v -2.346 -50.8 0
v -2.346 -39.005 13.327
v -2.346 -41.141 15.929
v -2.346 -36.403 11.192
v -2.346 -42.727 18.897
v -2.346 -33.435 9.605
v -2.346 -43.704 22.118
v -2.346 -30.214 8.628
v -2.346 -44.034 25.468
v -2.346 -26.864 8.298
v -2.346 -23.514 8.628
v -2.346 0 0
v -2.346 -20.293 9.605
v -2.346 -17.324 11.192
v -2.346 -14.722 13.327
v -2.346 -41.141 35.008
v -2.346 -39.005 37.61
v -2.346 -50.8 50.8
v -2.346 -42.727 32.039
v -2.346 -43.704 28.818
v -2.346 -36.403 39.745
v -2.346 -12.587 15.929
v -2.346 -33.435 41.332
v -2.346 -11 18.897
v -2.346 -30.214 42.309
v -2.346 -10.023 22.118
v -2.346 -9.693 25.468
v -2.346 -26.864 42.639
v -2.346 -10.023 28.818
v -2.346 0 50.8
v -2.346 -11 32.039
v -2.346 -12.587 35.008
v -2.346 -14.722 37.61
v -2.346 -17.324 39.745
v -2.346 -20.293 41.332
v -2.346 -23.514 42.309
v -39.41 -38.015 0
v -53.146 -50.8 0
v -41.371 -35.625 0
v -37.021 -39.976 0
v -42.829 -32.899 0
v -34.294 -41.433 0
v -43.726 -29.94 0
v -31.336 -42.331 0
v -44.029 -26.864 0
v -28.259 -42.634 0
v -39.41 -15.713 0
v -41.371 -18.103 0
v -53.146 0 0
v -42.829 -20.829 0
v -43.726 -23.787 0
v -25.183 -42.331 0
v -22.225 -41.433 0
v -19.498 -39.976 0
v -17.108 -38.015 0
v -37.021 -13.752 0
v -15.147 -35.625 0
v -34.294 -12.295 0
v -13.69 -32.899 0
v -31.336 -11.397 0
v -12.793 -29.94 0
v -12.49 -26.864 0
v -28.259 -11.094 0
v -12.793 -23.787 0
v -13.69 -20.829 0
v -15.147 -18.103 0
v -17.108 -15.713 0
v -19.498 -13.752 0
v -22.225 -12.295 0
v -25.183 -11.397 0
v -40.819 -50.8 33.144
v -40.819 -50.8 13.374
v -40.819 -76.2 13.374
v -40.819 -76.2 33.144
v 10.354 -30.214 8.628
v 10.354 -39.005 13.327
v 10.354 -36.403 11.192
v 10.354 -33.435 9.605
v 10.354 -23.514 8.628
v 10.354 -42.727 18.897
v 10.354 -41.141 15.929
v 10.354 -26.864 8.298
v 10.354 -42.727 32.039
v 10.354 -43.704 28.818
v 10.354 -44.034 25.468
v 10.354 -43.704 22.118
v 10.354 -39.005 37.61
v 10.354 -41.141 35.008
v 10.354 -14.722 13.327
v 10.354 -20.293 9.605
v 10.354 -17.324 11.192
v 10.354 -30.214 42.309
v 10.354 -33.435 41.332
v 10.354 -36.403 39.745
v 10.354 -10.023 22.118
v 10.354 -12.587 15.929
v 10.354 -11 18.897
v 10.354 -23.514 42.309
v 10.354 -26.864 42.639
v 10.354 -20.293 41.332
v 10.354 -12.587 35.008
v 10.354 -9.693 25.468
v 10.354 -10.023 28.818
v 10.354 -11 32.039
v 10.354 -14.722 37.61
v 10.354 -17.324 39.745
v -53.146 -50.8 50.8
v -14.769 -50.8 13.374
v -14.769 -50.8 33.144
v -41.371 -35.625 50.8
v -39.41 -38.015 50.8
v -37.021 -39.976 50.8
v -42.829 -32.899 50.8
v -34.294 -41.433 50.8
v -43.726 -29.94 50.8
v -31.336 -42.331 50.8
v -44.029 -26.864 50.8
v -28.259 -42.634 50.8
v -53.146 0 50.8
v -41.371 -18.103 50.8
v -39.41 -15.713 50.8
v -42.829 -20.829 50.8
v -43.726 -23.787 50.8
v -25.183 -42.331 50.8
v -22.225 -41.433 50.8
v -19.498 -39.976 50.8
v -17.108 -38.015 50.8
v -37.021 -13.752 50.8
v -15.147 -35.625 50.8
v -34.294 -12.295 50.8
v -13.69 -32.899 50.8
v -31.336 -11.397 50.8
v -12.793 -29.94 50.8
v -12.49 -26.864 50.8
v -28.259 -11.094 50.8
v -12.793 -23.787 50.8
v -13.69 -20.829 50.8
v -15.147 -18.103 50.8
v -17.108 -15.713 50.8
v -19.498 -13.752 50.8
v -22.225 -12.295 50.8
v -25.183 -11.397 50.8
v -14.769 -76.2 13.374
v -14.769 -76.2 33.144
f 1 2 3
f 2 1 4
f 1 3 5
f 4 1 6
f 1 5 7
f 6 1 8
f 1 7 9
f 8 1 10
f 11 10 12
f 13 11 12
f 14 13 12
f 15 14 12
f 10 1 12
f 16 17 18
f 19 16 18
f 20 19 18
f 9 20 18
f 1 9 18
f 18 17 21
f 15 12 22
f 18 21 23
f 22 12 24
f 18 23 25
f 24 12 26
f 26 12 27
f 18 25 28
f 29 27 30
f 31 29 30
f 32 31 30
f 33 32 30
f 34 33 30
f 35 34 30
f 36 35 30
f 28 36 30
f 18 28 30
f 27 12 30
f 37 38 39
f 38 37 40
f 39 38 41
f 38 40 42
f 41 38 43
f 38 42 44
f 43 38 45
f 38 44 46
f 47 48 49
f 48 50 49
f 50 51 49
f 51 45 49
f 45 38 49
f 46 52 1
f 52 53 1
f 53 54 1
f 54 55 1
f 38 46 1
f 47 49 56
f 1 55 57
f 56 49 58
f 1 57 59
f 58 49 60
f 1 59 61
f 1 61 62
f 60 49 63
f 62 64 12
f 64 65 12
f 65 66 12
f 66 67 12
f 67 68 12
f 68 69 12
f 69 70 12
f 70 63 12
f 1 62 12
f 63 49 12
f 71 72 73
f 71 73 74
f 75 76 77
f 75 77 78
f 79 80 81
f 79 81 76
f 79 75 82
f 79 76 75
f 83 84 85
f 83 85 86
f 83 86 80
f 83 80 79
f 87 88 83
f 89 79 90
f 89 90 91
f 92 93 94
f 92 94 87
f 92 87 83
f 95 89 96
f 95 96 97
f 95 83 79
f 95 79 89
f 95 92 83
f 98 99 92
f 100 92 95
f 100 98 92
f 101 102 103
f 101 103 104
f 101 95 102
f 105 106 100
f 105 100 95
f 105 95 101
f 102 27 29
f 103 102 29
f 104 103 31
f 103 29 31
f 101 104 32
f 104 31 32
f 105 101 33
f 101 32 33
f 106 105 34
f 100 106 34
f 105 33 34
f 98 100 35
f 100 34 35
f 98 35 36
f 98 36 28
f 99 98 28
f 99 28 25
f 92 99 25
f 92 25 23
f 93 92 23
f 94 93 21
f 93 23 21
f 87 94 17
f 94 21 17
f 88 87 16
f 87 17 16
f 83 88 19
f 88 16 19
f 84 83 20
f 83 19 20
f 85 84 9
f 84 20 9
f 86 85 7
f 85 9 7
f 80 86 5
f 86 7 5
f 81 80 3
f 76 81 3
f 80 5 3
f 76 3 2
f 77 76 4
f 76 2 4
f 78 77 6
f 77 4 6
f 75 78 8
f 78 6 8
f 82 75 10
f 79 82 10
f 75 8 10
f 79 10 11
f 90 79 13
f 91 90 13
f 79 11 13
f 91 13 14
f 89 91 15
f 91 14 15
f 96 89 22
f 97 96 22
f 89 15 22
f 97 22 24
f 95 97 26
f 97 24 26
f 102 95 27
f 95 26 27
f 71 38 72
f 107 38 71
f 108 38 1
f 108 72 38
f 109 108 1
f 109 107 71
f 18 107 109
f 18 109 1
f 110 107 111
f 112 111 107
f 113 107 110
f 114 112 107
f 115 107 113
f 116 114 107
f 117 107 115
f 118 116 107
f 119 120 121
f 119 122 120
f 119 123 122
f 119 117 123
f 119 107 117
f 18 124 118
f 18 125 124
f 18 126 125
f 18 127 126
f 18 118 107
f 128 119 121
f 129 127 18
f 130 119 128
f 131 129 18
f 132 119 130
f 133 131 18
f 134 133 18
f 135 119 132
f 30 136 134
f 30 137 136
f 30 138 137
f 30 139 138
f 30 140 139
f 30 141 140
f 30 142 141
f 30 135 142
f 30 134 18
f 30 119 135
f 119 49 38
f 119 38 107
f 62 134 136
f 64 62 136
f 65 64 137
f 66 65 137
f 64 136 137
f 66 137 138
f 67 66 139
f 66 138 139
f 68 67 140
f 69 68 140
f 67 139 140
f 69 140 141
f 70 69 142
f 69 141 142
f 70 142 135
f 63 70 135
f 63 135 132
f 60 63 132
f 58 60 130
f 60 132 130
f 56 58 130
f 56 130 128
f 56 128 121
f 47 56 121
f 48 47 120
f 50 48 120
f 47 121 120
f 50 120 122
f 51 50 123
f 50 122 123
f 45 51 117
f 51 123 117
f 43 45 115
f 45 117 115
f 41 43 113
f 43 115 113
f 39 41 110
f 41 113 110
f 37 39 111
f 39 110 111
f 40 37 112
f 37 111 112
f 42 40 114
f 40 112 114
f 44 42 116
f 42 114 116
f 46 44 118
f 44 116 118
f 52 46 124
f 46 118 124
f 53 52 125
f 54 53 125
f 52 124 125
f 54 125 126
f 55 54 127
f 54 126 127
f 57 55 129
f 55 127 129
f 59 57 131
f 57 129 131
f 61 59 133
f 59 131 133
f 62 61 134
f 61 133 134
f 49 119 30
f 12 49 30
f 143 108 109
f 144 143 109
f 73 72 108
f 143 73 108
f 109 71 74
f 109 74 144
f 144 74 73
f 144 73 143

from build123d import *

# Parameters (mm, degrees)
F0_W     = 50.8
F0_H     = 50.8
F1_DEPTH = 50.8
F2_W     = 26.049768
F2_H     = 19.769912
F3_DEPTH = 25.4
F4_R     = 15.769687
F5_DEPTH = 50.8
F6_R     = 17.170546
F7_DEPTH = 12.7


with BuildPart() as f1:
    # F0 (on Front) → F1 (new body)
    with BuildSketch(Plane.XZ):
        with Locations((-27.746176, 25.4)):
            Rectangle(F0_W, F0_H)
    extrude(amount=F1_DEPTH)

    # F2 (on face) → F3 (join)
    with BuildSketch(Plane.XZ.offset(50.8)):
        with Locations((-27.794172, 23.258721)):
            Rectangle(F2_W, F2_H)
    extrude(amount=F3_DEPTH)

    # F4 (on face) → F5 (cut)
    with BuildSketch(Plane.XY.offset(50.8)):
        with Locations((-28.259346, -26.863825)):
            Circle(F4_R)
    extrude(amount=-F5_DEPTH, mode=Mode.SUBTRACT)

    # F6 (on face) → F7 (join)
    with BuildSketch(Plane.YZ.offset(-2.346176)):
        with Locations((-26.863823, 25.468299)):
            Circle(F6_R)
    extrude(amount=F7_DEPTH)


solid = f1.part
